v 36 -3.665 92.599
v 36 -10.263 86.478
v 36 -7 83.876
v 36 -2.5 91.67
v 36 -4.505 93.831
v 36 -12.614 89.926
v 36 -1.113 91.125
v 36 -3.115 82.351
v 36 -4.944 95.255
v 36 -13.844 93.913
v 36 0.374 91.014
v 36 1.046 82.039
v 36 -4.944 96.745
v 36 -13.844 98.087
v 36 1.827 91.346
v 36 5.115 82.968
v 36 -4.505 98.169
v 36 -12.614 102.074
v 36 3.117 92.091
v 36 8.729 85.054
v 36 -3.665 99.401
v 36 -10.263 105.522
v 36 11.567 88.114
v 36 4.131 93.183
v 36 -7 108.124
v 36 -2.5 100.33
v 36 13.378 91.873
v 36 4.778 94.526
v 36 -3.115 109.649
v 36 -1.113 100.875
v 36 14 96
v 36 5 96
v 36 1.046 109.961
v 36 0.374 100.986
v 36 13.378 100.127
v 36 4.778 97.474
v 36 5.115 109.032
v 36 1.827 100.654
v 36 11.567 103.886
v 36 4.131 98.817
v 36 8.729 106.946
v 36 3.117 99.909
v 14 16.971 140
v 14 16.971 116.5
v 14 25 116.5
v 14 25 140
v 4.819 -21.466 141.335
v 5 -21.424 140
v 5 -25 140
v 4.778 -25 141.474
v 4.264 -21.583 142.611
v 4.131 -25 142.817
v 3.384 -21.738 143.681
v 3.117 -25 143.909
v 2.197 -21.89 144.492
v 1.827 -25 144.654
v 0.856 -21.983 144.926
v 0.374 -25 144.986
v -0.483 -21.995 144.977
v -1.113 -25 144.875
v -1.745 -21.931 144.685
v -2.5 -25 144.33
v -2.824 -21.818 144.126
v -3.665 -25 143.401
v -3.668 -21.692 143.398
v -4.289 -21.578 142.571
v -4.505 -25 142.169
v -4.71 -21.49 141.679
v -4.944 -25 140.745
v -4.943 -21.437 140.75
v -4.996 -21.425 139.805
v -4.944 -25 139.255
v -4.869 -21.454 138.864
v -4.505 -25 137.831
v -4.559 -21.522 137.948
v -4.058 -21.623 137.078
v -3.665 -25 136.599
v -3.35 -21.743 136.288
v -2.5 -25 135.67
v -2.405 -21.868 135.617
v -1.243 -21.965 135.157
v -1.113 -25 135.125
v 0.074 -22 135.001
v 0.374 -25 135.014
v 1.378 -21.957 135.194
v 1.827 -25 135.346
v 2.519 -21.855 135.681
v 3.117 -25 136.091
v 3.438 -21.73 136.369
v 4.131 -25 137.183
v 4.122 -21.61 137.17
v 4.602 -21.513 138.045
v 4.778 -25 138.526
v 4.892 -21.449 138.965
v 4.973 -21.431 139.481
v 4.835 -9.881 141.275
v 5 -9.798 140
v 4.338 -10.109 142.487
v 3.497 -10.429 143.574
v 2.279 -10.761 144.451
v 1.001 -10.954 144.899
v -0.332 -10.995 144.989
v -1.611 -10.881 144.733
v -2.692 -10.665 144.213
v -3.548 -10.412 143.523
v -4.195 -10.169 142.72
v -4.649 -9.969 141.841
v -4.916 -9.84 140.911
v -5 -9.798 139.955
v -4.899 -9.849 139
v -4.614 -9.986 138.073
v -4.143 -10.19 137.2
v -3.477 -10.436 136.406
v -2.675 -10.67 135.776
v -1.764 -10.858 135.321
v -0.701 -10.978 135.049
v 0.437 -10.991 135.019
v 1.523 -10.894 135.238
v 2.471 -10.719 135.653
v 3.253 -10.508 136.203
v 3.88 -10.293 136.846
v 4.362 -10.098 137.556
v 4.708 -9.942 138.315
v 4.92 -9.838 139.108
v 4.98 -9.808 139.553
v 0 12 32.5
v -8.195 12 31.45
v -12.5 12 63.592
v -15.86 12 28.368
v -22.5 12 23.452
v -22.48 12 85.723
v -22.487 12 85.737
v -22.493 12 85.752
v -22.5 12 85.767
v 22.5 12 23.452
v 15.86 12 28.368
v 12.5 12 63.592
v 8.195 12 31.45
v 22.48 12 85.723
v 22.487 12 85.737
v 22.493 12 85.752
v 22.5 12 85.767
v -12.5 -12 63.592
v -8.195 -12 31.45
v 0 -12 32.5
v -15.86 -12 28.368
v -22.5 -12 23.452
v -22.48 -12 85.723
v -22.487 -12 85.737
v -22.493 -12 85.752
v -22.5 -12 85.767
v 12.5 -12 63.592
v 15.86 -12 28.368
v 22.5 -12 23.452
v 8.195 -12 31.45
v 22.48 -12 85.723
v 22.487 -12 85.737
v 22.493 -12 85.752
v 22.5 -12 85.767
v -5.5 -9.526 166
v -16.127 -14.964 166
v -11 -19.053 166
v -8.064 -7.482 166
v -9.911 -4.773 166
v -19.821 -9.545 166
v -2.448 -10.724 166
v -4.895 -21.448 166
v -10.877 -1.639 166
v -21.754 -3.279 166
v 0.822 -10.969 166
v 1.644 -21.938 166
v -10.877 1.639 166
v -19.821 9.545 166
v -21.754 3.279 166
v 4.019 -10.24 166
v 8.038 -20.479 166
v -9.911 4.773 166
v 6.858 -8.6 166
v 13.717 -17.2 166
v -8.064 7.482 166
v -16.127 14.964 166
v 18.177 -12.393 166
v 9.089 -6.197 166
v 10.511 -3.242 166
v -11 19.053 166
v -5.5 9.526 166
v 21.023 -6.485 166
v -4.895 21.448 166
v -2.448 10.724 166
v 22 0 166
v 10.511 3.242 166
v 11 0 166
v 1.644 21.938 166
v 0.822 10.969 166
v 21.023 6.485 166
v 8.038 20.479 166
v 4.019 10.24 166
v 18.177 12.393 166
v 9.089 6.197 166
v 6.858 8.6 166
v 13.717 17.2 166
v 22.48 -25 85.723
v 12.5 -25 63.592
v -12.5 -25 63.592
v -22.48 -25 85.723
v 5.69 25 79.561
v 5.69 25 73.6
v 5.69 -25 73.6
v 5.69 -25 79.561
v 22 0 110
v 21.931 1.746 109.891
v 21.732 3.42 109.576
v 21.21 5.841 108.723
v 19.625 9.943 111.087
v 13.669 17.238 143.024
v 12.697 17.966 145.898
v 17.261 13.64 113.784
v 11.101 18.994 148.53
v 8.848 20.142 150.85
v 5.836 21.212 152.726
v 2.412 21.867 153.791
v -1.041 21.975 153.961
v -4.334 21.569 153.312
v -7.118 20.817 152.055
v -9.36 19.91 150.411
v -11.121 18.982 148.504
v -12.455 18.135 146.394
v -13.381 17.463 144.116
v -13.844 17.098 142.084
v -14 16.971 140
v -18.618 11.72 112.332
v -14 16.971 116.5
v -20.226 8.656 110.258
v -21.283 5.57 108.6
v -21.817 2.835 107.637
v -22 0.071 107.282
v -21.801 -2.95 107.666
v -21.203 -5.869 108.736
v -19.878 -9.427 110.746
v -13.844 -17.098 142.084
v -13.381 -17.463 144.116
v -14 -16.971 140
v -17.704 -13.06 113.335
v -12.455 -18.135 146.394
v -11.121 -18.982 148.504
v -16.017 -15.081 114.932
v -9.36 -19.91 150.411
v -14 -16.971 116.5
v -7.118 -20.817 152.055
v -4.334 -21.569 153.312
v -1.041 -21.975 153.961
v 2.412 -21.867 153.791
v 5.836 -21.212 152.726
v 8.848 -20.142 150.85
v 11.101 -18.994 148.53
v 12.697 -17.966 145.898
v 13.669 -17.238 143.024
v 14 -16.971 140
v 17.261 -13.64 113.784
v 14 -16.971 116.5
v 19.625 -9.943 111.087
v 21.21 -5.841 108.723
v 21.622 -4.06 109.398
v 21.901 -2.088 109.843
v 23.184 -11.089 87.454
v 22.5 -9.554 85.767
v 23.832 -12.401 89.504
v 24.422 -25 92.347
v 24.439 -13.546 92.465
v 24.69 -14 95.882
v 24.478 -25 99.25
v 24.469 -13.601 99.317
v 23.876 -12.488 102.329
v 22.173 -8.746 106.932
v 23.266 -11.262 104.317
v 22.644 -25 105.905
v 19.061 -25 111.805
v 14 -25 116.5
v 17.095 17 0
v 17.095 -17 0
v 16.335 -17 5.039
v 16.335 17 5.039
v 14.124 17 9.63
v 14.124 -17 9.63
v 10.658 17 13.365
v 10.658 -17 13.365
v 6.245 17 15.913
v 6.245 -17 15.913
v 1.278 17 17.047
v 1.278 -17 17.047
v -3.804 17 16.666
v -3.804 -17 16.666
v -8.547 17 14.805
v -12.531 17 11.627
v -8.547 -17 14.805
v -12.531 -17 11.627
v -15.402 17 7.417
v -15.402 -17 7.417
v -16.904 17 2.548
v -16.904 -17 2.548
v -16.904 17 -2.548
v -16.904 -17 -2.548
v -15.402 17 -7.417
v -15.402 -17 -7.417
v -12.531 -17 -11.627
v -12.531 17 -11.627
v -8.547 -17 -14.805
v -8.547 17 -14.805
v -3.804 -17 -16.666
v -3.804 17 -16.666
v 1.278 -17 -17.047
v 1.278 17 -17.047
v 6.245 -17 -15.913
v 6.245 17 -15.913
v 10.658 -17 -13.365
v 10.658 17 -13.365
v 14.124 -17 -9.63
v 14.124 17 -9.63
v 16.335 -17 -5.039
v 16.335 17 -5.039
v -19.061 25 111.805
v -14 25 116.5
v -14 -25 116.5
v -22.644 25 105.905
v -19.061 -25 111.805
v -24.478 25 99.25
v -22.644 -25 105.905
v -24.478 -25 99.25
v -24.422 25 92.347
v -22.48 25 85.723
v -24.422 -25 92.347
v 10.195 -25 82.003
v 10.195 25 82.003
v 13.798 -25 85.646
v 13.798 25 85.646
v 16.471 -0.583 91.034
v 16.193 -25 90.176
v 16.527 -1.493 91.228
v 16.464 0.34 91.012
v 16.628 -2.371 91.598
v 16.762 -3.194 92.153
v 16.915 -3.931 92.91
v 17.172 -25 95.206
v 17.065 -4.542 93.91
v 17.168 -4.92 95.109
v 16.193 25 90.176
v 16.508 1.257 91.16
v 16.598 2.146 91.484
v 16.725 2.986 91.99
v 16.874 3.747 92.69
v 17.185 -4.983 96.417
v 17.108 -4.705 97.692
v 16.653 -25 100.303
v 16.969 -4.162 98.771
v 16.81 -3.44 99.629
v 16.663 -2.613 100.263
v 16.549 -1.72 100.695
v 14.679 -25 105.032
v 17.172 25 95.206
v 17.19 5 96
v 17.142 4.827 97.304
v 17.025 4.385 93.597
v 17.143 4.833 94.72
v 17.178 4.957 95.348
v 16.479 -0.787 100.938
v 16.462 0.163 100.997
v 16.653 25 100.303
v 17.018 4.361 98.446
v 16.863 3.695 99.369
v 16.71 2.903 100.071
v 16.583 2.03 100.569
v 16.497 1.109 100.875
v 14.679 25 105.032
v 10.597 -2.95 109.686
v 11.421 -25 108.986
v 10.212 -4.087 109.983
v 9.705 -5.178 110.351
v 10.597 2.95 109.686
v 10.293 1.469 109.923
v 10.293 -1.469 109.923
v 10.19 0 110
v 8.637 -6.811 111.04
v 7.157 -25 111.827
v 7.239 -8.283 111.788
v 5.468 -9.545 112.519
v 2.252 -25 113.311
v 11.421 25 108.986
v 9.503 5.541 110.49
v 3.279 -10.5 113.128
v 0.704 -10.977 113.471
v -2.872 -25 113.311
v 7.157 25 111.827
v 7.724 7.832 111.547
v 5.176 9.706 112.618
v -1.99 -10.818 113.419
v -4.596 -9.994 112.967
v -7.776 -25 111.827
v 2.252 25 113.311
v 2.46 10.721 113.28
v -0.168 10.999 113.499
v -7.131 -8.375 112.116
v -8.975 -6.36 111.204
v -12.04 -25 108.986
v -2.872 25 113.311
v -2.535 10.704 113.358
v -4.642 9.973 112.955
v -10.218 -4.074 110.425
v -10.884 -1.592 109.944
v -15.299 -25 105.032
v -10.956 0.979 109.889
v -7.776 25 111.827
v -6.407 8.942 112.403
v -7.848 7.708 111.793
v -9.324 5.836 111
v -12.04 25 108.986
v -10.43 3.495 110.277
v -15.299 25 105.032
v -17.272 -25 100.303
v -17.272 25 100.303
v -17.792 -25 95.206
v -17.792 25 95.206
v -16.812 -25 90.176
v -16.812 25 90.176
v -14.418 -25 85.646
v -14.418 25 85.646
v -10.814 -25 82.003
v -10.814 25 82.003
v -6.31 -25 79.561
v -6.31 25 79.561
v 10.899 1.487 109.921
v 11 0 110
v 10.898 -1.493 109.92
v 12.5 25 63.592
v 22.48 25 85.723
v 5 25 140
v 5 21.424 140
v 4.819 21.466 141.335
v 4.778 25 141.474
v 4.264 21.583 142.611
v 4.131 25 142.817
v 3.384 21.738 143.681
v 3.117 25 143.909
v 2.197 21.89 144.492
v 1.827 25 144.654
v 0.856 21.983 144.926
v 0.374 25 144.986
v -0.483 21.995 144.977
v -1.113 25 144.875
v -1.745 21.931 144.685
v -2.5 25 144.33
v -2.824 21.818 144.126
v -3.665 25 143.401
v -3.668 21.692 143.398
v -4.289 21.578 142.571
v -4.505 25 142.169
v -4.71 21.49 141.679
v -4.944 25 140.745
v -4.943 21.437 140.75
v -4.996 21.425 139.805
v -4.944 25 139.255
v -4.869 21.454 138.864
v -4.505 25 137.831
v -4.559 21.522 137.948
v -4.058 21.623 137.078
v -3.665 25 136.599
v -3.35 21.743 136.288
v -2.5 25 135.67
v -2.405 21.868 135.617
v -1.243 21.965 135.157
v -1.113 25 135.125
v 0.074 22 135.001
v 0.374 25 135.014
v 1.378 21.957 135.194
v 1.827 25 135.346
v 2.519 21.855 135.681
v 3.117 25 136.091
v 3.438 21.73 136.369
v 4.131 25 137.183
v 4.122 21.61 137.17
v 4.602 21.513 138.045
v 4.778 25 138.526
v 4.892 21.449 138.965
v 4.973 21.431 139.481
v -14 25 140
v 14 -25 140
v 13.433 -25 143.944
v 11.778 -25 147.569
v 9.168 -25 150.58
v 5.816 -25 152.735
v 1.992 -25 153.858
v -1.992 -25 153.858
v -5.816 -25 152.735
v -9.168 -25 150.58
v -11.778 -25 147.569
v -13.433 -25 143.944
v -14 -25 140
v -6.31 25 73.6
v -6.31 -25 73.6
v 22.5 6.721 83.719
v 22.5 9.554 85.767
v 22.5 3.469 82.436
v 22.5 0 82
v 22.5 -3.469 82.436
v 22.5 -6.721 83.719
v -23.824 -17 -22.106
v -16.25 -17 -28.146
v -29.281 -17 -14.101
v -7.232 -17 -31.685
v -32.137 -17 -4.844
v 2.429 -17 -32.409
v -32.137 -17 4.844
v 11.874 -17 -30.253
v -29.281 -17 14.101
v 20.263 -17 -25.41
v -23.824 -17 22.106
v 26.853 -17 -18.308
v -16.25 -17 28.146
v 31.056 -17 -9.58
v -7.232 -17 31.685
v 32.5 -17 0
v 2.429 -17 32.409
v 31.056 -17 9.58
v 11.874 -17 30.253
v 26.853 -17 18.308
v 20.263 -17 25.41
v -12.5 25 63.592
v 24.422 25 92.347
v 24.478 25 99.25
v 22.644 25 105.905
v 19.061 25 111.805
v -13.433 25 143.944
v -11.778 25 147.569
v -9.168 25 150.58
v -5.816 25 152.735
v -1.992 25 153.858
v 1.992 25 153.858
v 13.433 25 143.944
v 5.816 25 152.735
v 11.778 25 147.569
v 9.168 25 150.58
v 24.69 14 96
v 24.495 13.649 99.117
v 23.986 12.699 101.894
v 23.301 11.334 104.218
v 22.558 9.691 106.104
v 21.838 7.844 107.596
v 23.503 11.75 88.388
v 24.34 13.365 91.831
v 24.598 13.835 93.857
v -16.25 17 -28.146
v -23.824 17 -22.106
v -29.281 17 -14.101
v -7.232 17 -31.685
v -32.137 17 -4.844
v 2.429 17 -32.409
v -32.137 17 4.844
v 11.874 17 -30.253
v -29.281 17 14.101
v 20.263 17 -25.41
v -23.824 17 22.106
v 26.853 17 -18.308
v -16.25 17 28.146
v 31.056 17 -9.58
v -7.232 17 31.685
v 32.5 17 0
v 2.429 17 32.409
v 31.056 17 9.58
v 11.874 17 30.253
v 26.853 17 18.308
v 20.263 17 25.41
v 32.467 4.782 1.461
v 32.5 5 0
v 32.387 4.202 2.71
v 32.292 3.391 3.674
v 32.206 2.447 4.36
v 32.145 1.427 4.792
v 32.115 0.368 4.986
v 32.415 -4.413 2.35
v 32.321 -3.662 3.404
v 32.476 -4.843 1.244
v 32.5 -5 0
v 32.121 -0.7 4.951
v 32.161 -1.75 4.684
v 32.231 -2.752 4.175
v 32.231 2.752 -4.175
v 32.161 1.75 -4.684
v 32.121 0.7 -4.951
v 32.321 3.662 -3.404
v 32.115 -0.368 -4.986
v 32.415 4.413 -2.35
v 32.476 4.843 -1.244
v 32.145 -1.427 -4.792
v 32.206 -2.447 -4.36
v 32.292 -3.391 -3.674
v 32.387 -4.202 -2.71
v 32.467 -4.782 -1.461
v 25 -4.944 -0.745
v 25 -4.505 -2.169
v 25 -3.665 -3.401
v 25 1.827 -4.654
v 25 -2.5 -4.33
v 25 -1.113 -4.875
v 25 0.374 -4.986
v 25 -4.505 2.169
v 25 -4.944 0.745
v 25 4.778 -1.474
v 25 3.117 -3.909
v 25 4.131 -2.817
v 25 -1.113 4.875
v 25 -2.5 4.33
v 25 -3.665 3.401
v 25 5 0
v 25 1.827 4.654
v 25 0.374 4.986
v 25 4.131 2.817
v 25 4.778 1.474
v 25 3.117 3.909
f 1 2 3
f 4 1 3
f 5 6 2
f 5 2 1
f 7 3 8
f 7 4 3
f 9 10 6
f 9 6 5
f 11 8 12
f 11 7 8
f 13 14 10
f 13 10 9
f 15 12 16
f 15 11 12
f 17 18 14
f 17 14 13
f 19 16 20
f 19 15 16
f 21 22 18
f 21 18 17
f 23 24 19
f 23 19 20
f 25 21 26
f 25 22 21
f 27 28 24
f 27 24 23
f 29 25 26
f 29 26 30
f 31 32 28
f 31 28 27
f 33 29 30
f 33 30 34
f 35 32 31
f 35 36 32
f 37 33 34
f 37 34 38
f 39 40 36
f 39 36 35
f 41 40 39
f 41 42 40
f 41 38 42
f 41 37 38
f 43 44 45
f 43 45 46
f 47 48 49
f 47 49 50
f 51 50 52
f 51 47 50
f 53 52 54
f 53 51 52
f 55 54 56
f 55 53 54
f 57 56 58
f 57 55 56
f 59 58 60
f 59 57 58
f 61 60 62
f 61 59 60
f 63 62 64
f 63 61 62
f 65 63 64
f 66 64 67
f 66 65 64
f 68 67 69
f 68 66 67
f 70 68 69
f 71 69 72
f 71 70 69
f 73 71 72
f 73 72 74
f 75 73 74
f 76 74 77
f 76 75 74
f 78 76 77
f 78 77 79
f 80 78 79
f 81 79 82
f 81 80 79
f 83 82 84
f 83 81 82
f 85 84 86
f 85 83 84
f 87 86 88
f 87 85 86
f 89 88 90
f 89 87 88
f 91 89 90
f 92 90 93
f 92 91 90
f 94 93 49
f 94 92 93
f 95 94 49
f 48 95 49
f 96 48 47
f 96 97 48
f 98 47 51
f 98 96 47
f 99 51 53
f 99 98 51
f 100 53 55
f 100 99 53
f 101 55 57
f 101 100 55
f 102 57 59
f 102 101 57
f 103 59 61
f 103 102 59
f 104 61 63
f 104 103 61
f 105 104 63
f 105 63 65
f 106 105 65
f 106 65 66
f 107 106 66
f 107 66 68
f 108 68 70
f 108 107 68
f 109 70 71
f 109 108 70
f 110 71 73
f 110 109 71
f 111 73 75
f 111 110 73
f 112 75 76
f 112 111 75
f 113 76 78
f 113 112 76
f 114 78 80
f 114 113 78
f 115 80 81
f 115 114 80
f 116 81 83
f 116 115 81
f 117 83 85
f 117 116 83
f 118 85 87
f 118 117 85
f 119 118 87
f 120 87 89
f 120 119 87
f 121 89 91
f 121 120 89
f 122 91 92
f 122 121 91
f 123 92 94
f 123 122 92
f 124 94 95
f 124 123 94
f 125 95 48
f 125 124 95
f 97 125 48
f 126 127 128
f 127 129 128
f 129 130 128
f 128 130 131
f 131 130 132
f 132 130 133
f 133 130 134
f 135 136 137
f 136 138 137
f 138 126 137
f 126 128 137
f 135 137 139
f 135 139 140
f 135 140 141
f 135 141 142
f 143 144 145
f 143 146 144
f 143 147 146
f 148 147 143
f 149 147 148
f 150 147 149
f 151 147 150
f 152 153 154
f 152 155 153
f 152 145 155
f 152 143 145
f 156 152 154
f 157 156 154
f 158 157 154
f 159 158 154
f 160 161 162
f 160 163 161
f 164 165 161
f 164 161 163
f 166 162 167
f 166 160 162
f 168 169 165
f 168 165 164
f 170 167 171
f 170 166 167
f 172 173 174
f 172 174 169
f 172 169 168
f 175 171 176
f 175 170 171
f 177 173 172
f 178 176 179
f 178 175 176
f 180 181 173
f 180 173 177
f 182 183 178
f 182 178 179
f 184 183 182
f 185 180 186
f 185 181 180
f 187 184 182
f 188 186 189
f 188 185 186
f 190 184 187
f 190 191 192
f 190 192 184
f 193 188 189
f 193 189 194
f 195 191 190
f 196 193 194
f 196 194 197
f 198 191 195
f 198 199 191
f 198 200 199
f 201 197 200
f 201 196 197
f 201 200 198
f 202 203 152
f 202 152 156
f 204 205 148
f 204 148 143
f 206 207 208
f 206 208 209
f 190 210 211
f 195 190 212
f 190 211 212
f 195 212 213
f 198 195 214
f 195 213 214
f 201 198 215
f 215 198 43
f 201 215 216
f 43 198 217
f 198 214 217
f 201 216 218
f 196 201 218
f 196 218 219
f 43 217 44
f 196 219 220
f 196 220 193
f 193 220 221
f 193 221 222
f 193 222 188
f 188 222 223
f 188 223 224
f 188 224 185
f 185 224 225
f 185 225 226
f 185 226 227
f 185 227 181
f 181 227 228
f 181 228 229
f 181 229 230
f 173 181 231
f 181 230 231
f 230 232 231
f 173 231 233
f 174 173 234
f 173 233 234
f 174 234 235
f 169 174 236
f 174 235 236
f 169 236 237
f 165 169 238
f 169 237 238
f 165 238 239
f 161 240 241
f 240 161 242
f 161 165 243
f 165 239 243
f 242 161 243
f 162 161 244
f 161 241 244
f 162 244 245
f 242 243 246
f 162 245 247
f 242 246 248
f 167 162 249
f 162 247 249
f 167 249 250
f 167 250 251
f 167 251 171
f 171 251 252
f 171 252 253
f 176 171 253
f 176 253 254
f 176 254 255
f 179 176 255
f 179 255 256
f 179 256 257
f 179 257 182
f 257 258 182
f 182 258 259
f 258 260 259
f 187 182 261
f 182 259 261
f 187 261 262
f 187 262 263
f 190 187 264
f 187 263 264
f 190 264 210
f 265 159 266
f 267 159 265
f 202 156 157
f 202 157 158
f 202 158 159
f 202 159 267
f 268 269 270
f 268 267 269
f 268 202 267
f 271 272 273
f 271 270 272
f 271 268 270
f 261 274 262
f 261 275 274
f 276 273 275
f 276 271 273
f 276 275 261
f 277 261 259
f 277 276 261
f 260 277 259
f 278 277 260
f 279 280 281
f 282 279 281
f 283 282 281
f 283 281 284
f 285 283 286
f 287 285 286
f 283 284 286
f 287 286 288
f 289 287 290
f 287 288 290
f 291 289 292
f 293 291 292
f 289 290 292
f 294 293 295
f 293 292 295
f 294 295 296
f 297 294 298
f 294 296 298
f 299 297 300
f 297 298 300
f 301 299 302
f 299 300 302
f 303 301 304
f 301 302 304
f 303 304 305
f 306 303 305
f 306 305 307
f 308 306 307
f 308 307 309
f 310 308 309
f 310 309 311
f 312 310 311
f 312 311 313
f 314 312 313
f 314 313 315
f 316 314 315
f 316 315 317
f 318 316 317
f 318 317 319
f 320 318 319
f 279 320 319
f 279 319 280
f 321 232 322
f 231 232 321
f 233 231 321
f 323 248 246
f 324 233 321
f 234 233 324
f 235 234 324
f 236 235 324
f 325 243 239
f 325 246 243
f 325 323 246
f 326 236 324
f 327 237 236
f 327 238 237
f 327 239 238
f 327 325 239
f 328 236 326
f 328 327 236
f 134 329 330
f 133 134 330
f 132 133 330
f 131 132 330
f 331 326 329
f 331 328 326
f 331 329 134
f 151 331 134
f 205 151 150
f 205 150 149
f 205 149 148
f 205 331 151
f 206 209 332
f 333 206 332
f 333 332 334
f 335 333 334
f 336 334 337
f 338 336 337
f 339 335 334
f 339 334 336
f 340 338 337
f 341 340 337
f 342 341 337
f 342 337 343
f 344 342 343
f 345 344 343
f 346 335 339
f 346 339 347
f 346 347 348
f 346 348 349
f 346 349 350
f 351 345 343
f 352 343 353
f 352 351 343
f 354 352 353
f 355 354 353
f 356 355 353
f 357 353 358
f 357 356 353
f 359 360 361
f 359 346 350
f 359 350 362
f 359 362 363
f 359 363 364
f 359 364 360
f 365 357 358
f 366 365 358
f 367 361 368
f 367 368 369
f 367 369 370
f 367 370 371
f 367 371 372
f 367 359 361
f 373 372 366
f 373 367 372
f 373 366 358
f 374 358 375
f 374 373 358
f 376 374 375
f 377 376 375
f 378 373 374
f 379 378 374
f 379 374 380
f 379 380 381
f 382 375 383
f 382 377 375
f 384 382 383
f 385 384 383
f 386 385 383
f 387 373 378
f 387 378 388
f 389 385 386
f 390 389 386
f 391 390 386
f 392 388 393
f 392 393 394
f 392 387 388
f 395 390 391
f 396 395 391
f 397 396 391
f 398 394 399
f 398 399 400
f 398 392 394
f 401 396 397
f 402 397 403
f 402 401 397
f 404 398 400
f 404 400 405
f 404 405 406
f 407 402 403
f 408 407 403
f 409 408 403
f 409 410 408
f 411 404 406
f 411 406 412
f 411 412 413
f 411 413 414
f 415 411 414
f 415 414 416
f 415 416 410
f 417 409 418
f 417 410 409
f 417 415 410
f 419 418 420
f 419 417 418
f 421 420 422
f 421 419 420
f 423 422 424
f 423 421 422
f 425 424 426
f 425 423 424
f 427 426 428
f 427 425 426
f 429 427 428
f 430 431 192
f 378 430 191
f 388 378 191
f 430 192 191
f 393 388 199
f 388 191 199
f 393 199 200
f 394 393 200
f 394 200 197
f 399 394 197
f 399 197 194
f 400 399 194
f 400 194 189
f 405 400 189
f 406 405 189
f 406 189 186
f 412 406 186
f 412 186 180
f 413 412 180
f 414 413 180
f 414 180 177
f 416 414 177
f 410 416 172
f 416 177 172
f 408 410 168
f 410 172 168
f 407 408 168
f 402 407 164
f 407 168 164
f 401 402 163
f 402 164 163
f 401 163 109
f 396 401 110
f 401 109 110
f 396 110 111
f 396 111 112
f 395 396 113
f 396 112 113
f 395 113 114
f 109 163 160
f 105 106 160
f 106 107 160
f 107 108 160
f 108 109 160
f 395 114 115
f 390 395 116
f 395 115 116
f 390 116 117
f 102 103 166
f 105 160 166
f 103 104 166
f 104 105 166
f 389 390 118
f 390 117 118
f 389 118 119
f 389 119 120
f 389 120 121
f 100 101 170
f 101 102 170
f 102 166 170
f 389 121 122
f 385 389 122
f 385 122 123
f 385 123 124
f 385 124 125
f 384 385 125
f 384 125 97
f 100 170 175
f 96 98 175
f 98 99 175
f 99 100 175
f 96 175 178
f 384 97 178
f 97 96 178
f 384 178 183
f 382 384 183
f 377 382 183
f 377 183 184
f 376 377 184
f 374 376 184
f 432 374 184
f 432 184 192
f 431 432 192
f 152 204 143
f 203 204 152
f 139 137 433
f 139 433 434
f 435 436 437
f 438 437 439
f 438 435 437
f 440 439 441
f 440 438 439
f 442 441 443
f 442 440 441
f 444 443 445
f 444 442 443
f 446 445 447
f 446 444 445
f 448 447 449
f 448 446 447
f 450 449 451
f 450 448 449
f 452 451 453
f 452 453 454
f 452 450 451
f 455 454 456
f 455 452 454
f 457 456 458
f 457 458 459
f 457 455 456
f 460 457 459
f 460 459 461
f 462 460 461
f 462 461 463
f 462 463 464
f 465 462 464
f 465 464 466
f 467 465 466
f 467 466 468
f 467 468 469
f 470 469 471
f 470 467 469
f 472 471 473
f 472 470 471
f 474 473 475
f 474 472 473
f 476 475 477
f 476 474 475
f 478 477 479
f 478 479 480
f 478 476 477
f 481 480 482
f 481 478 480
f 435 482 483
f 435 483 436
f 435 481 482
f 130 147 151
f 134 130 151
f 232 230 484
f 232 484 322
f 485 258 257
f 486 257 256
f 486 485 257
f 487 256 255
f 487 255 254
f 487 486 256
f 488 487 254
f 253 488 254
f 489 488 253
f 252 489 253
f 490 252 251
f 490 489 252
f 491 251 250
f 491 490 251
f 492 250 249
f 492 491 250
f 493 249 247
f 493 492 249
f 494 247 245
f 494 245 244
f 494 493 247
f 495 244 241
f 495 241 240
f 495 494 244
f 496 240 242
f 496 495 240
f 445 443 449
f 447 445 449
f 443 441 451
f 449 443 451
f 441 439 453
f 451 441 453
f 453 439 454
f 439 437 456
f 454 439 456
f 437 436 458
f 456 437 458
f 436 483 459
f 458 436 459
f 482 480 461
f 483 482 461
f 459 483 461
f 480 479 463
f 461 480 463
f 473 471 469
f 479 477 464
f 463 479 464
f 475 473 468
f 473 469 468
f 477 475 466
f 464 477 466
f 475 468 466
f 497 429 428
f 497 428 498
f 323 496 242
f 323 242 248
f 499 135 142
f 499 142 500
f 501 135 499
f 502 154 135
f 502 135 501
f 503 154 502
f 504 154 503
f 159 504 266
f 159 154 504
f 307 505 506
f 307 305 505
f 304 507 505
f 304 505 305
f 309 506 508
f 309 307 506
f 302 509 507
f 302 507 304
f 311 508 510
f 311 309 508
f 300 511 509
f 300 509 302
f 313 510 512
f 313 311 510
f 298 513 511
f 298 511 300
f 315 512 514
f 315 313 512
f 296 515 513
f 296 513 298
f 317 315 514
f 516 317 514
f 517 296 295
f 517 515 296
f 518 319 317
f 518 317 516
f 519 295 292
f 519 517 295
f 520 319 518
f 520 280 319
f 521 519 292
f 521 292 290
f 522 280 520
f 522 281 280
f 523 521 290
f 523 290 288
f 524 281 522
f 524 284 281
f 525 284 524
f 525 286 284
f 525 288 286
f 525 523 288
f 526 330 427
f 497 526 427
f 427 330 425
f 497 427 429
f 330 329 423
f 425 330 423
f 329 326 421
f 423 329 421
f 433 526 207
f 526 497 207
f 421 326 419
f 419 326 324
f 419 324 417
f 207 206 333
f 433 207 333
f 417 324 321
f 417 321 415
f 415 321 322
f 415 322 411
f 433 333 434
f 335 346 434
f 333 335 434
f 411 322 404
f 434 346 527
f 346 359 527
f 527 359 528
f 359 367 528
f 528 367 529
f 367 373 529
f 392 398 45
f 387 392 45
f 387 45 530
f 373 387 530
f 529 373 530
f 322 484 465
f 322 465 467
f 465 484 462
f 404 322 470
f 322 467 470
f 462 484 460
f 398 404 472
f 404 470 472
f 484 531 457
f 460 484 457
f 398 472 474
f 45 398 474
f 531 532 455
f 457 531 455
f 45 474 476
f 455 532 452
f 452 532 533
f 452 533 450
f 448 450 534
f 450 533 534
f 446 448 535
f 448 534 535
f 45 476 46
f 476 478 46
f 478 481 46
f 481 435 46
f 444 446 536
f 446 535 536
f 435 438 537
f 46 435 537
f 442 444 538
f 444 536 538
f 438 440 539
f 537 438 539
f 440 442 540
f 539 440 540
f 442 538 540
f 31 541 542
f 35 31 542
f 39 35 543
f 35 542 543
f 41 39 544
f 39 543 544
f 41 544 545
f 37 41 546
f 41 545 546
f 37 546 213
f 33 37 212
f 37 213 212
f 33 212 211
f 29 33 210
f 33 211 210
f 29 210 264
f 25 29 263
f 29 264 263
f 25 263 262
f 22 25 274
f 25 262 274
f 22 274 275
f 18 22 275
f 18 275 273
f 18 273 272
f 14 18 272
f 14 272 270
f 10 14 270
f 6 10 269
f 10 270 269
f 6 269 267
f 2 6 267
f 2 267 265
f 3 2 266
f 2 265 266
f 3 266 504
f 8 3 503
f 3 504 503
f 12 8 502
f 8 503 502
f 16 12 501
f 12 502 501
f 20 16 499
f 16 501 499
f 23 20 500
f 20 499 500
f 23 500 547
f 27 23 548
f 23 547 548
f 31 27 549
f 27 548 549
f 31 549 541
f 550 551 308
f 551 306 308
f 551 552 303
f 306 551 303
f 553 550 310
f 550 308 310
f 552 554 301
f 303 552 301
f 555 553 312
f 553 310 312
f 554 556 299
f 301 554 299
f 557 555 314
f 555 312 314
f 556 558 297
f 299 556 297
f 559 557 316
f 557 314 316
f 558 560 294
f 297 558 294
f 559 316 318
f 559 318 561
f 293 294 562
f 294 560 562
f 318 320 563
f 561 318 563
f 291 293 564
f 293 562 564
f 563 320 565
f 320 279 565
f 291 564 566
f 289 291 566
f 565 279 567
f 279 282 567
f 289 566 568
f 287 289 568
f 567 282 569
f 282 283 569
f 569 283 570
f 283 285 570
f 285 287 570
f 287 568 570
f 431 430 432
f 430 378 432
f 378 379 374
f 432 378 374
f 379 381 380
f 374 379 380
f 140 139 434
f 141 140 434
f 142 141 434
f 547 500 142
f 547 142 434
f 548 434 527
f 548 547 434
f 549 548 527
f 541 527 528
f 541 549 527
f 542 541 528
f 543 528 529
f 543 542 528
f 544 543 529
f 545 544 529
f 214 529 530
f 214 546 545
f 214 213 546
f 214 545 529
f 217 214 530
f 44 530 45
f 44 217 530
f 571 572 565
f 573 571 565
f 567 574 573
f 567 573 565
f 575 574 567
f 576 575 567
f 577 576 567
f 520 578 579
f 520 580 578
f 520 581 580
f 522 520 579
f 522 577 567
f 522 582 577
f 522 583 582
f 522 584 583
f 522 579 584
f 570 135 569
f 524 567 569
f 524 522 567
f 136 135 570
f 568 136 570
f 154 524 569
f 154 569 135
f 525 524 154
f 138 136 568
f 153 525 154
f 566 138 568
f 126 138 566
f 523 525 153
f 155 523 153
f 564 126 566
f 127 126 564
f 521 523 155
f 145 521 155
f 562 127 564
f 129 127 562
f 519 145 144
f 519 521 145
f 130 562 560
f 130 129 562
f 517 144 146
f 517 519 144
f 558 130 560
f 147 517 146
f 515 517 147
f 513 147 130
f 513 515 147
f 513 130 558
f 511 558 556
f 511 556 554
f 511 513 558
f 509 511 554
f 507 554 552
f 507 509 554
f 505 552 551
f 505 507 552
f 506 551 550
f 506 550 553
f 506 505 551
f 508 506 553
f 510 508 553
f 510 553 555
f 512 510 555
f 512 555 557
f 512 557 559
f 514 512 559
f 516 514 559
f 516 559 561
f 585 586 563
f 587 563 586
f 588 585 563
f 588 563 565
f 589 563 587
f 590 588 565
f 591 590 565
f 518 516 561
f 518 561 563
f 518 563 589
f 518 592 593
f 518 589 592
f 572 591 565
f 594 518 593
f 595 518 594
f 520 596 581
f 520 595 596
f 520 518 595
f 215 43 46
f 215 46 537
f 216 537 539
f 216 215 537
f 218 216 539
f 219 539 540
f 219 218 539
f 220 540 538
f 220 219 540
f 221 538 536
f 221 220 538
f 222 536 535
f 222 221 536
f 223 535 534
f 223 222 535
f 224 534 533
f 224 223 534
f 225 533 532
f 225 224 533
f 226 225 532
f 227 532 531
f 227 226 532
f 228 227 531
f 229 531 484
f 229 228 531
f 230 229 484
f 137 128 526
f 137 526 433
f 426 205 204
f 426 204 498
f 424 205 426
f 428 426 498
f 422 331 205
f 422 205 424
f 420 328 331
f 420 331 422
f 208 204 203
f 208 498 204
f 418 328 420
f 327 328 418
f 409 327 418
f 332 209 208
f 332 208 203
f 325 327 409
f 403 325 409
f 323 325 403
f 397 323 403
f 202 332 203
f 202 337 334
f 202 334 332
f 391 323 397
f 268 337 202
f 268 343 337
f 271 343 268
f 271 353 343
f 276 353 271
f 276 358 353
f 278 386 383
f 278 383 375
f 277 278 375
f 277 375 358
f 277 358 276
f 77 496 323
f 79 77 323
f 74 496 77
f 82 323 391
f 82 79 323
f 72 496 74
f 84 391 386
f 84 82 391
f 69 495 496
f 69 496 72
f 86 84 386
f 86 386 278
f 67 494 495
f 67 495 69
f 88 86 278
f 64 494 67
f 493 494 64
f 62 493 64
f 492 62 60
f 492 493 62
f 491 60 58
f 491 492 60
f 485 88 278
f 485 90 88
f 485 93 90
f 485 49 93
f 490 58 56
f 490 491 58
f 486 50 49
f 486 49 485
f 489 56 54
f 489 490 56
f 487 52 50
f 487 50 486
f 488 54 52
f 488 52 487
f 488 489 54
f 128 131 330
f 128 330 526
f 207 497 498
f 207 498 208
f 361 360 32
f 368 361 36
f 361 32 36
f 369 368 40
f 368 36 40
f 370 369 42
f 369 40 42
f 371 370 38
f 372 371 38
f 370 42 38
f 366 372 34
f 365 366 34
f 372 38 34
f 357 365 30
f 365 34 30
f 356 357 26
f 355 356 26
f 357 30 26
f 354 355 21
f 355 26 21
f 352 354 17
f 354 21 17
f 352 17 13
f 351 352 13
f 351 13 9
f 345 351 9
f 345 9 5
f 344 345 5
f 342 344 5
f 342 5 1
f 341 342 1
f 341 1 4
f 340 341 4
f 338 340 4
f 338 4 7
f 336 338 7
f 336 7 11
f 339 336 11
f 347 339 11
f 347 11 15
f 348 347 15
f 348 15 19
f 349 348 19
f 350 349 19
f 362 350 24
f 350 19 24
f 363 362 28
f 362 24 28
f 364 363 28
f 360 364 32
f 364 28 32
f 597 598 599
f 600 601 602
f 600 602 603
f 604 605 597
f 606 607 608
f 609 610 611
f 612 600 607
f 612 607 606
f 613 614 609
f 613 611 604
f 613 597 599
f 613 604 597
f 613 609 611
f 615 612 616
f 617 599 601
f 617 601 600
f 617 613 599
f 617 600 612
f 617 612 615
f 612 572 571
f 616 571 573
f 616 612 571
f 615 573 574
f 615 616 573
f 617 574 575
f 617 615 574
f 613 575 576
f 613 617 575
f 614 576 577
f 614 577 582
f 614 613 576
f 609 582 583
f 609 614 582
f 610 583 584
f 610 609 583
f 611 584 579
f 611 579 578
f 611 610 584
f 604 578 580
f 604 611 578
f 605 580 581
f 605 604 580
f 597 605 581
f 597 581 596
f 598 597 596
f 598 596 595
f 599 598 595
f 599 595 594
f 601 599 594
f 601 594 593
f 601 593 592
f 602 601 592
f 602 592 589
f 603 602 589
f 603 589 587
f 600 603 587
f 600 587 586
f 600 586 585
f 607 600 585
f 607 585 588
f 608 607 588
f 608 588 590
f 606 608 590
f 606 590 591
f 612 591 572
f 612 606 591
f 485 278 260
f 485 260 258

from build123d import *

# Parameters (mm, degrees)
F0_W           = 45
F0_H           = 96
F1_DEPTH       = 12
F2_R           = 32.5
F3_DEPTH       = 17
F4_R           = 5
F5_DEPTH       = 25
F6_R           = 17.0948723133
F7_DEPTH       = 42.001
F9_START       = 25
F8_R           = 5
F9_DEPTH       = 75
F10_R          = 22
F11_DEPTH      = 70
F12_R          = 11
F13_DEPTH      = 60
F14_R          = 14
F15_DEPTH      = 36
F16_R          = 5
F17_DEPTH      = 25
F19_DEPTH      = 25.0010001
F19_DEPTH_BACK = 25
F20_R          = 5
F21_DEPTH      = 25.0010001


with BuildPart() as f1:
    # F0 (on Front) → F1 (new body, symmetric)
    with BuildSketch(Plane.XZ):
        with Locations((0, 48)):
            Rectangle(F0_W, F0_H)
    extrude(amount=F1_DEPTH, both=True)

    # F2 (on Front) → F3 (join, symmetric)
    with BuildSketch(Plane.XZ):
        Circle(F2_R)
    extrude(amount=F3_DEPTH, both=True)

    # F4 (on Front) → F5 (join, symmetric)
    with BuildSketch(Plane.XZ):
        with BuildLine():
            ThreePointArc((14, 140), (0, 154), (-14, 140))
            Line((-14, 140), (-14, 116.4995838087))
            ThreePointArc((-14, 116.4995838087), (-23.792144731, 102.6409215632), (-22.4801481153, 85.7226686231))
            Line((-22.4801481153, 85.7226686231), (-12.5, 63.5918357929))
            Line((-12.5, 63.5918357929), (12.5, 63.5918357929))
            Line((12.5, 63.5918357929), (22.4801481153, 85.7226686231))
            ThreePointArc((22.4801481153, 85.7226686231), (23.792144731, 102.6409215632), (14, 116.4995838087))
            Line((14, 116.4995838087), (14, 140))
        make_face()
        with BuildLine():
            Line((-6.3096842617, 73.6), (-6.3096842617, 79.5607177772))
            ThreePointArc((-6.3096842617, 79.5607177772), (-0.3096842617, 113.5), (5.6903157383, 79.5607177772))
            Line((5.6903157383, 79.5607177772), (5.6903157383, 73.6))
            Line((5.6903157383, 73.6), (-6.3096842617, 73.6))
        make_face(mode=Mode.SUBTRACT)
        with Locations((0, 140)):
            Circle(F4_R, mode=Mode.SUBTRACT)
    extrude(amount=F5_DEPTH, both=True)

    # F6 (on face) → F7 (cut, through all)
    with BuildSketch(Plane.XZ.offset(17)):
        Circle(F6_R)
    extrude(amount=-F7_DEPTH, mode=Mode.SUBTRACT)

    # F8 (on Right) → F9 (cut)
    with BuildSketch(Plane.YZ.offset(F9_START)):
        Circle(F8_R)
    extrude(amount=F9_DEPTH, mode=Mode.SUBTRACT)

    # F10 (on face) → F11 (join)
    with BuildSketch(Plane.XY.offset(96)):
        Circle(F10_R)
    extrude(amount=F11_DEPTH)

    # F12 (on face) → F13 (cut)
    with BuildSketch(Plane.XY.offset(166)):
        Circle(F12_R)
    extrude(amount=-F13_DEPTH, mode=Mode.SUBTRACT)

    # F14 (on Right) → F15 (join)
    with BuildSketch(Plane.YZ):
        with Locations((0, 96)):
            Circle(F14_R)
    extrude(amount=F15_DEPTH)

    # F16 (on face) → F17 (cut)
    with BuildSketch(Plane.YZ.offset(36)):
        with Locations((0, 96)):
            Circle(F16_R)
    extrude(amount=-F17_DEPTH, mode=Mode.SUBTRACT)

    # F18 (on Front) → F19 (cut, two sides)
    with BuildSketch(Plane.XZ) as f19_sk:
        with BuildLine():
            ThreePointArc((5.6903157383, 79.5607177772), (14.029946138, 85.9687986761), (17.1903157383, 96))
            ThreePointArc((17.1903157383, 96), (-10.3408855855, 110.3396303997), (-6.3096842617, 79.5607177772))
            Line((-6.3096842617, 79.5607177772), (5.6903157383, 79.5607177772))
        make_face()
        with BuildLine():
            Line((5.6903157383, 79.5607177772), (-6.3096842617, 79.5607177772))
            ThreePointArc((-6.3096842617, 79.5607177772), (-0.3096842617, 78.5), (5.6903157383, 79.5607177772))
        make_face()
        with BuildLine():
            ThreePointArc((5.6903157383, 79.5607177772), (-0.3096842617, 78.5), (-6.3096842617, 79.5607177772))
            Line((-6.3096842617, 79.5607177772), (-6.3096842617, 73.6))
            Line((-6.3096842617, 73.6), (5.6903157383, 73.6))
            Line((5.6903157383, 73.6), (5.6903157383, 79.5607177772))
        make_face()
    extrude(amount=-F19_DEPTH, mode=Mode.SUBTRACT)
    extrude(f19_sk.sketch, amount=F19_DEPTH_BACK, mode=Mode.SUBTRACT)

    # F20 (on Front) → F21 (cut, through all)
    with BuildSketch(Plane.XZ):
        with Locations((0, 140)):
            Circle(F20_R)
    extrude(amount=F21_DEPTH, mode=Mode.SUBTRACT)


solid = f1.part
